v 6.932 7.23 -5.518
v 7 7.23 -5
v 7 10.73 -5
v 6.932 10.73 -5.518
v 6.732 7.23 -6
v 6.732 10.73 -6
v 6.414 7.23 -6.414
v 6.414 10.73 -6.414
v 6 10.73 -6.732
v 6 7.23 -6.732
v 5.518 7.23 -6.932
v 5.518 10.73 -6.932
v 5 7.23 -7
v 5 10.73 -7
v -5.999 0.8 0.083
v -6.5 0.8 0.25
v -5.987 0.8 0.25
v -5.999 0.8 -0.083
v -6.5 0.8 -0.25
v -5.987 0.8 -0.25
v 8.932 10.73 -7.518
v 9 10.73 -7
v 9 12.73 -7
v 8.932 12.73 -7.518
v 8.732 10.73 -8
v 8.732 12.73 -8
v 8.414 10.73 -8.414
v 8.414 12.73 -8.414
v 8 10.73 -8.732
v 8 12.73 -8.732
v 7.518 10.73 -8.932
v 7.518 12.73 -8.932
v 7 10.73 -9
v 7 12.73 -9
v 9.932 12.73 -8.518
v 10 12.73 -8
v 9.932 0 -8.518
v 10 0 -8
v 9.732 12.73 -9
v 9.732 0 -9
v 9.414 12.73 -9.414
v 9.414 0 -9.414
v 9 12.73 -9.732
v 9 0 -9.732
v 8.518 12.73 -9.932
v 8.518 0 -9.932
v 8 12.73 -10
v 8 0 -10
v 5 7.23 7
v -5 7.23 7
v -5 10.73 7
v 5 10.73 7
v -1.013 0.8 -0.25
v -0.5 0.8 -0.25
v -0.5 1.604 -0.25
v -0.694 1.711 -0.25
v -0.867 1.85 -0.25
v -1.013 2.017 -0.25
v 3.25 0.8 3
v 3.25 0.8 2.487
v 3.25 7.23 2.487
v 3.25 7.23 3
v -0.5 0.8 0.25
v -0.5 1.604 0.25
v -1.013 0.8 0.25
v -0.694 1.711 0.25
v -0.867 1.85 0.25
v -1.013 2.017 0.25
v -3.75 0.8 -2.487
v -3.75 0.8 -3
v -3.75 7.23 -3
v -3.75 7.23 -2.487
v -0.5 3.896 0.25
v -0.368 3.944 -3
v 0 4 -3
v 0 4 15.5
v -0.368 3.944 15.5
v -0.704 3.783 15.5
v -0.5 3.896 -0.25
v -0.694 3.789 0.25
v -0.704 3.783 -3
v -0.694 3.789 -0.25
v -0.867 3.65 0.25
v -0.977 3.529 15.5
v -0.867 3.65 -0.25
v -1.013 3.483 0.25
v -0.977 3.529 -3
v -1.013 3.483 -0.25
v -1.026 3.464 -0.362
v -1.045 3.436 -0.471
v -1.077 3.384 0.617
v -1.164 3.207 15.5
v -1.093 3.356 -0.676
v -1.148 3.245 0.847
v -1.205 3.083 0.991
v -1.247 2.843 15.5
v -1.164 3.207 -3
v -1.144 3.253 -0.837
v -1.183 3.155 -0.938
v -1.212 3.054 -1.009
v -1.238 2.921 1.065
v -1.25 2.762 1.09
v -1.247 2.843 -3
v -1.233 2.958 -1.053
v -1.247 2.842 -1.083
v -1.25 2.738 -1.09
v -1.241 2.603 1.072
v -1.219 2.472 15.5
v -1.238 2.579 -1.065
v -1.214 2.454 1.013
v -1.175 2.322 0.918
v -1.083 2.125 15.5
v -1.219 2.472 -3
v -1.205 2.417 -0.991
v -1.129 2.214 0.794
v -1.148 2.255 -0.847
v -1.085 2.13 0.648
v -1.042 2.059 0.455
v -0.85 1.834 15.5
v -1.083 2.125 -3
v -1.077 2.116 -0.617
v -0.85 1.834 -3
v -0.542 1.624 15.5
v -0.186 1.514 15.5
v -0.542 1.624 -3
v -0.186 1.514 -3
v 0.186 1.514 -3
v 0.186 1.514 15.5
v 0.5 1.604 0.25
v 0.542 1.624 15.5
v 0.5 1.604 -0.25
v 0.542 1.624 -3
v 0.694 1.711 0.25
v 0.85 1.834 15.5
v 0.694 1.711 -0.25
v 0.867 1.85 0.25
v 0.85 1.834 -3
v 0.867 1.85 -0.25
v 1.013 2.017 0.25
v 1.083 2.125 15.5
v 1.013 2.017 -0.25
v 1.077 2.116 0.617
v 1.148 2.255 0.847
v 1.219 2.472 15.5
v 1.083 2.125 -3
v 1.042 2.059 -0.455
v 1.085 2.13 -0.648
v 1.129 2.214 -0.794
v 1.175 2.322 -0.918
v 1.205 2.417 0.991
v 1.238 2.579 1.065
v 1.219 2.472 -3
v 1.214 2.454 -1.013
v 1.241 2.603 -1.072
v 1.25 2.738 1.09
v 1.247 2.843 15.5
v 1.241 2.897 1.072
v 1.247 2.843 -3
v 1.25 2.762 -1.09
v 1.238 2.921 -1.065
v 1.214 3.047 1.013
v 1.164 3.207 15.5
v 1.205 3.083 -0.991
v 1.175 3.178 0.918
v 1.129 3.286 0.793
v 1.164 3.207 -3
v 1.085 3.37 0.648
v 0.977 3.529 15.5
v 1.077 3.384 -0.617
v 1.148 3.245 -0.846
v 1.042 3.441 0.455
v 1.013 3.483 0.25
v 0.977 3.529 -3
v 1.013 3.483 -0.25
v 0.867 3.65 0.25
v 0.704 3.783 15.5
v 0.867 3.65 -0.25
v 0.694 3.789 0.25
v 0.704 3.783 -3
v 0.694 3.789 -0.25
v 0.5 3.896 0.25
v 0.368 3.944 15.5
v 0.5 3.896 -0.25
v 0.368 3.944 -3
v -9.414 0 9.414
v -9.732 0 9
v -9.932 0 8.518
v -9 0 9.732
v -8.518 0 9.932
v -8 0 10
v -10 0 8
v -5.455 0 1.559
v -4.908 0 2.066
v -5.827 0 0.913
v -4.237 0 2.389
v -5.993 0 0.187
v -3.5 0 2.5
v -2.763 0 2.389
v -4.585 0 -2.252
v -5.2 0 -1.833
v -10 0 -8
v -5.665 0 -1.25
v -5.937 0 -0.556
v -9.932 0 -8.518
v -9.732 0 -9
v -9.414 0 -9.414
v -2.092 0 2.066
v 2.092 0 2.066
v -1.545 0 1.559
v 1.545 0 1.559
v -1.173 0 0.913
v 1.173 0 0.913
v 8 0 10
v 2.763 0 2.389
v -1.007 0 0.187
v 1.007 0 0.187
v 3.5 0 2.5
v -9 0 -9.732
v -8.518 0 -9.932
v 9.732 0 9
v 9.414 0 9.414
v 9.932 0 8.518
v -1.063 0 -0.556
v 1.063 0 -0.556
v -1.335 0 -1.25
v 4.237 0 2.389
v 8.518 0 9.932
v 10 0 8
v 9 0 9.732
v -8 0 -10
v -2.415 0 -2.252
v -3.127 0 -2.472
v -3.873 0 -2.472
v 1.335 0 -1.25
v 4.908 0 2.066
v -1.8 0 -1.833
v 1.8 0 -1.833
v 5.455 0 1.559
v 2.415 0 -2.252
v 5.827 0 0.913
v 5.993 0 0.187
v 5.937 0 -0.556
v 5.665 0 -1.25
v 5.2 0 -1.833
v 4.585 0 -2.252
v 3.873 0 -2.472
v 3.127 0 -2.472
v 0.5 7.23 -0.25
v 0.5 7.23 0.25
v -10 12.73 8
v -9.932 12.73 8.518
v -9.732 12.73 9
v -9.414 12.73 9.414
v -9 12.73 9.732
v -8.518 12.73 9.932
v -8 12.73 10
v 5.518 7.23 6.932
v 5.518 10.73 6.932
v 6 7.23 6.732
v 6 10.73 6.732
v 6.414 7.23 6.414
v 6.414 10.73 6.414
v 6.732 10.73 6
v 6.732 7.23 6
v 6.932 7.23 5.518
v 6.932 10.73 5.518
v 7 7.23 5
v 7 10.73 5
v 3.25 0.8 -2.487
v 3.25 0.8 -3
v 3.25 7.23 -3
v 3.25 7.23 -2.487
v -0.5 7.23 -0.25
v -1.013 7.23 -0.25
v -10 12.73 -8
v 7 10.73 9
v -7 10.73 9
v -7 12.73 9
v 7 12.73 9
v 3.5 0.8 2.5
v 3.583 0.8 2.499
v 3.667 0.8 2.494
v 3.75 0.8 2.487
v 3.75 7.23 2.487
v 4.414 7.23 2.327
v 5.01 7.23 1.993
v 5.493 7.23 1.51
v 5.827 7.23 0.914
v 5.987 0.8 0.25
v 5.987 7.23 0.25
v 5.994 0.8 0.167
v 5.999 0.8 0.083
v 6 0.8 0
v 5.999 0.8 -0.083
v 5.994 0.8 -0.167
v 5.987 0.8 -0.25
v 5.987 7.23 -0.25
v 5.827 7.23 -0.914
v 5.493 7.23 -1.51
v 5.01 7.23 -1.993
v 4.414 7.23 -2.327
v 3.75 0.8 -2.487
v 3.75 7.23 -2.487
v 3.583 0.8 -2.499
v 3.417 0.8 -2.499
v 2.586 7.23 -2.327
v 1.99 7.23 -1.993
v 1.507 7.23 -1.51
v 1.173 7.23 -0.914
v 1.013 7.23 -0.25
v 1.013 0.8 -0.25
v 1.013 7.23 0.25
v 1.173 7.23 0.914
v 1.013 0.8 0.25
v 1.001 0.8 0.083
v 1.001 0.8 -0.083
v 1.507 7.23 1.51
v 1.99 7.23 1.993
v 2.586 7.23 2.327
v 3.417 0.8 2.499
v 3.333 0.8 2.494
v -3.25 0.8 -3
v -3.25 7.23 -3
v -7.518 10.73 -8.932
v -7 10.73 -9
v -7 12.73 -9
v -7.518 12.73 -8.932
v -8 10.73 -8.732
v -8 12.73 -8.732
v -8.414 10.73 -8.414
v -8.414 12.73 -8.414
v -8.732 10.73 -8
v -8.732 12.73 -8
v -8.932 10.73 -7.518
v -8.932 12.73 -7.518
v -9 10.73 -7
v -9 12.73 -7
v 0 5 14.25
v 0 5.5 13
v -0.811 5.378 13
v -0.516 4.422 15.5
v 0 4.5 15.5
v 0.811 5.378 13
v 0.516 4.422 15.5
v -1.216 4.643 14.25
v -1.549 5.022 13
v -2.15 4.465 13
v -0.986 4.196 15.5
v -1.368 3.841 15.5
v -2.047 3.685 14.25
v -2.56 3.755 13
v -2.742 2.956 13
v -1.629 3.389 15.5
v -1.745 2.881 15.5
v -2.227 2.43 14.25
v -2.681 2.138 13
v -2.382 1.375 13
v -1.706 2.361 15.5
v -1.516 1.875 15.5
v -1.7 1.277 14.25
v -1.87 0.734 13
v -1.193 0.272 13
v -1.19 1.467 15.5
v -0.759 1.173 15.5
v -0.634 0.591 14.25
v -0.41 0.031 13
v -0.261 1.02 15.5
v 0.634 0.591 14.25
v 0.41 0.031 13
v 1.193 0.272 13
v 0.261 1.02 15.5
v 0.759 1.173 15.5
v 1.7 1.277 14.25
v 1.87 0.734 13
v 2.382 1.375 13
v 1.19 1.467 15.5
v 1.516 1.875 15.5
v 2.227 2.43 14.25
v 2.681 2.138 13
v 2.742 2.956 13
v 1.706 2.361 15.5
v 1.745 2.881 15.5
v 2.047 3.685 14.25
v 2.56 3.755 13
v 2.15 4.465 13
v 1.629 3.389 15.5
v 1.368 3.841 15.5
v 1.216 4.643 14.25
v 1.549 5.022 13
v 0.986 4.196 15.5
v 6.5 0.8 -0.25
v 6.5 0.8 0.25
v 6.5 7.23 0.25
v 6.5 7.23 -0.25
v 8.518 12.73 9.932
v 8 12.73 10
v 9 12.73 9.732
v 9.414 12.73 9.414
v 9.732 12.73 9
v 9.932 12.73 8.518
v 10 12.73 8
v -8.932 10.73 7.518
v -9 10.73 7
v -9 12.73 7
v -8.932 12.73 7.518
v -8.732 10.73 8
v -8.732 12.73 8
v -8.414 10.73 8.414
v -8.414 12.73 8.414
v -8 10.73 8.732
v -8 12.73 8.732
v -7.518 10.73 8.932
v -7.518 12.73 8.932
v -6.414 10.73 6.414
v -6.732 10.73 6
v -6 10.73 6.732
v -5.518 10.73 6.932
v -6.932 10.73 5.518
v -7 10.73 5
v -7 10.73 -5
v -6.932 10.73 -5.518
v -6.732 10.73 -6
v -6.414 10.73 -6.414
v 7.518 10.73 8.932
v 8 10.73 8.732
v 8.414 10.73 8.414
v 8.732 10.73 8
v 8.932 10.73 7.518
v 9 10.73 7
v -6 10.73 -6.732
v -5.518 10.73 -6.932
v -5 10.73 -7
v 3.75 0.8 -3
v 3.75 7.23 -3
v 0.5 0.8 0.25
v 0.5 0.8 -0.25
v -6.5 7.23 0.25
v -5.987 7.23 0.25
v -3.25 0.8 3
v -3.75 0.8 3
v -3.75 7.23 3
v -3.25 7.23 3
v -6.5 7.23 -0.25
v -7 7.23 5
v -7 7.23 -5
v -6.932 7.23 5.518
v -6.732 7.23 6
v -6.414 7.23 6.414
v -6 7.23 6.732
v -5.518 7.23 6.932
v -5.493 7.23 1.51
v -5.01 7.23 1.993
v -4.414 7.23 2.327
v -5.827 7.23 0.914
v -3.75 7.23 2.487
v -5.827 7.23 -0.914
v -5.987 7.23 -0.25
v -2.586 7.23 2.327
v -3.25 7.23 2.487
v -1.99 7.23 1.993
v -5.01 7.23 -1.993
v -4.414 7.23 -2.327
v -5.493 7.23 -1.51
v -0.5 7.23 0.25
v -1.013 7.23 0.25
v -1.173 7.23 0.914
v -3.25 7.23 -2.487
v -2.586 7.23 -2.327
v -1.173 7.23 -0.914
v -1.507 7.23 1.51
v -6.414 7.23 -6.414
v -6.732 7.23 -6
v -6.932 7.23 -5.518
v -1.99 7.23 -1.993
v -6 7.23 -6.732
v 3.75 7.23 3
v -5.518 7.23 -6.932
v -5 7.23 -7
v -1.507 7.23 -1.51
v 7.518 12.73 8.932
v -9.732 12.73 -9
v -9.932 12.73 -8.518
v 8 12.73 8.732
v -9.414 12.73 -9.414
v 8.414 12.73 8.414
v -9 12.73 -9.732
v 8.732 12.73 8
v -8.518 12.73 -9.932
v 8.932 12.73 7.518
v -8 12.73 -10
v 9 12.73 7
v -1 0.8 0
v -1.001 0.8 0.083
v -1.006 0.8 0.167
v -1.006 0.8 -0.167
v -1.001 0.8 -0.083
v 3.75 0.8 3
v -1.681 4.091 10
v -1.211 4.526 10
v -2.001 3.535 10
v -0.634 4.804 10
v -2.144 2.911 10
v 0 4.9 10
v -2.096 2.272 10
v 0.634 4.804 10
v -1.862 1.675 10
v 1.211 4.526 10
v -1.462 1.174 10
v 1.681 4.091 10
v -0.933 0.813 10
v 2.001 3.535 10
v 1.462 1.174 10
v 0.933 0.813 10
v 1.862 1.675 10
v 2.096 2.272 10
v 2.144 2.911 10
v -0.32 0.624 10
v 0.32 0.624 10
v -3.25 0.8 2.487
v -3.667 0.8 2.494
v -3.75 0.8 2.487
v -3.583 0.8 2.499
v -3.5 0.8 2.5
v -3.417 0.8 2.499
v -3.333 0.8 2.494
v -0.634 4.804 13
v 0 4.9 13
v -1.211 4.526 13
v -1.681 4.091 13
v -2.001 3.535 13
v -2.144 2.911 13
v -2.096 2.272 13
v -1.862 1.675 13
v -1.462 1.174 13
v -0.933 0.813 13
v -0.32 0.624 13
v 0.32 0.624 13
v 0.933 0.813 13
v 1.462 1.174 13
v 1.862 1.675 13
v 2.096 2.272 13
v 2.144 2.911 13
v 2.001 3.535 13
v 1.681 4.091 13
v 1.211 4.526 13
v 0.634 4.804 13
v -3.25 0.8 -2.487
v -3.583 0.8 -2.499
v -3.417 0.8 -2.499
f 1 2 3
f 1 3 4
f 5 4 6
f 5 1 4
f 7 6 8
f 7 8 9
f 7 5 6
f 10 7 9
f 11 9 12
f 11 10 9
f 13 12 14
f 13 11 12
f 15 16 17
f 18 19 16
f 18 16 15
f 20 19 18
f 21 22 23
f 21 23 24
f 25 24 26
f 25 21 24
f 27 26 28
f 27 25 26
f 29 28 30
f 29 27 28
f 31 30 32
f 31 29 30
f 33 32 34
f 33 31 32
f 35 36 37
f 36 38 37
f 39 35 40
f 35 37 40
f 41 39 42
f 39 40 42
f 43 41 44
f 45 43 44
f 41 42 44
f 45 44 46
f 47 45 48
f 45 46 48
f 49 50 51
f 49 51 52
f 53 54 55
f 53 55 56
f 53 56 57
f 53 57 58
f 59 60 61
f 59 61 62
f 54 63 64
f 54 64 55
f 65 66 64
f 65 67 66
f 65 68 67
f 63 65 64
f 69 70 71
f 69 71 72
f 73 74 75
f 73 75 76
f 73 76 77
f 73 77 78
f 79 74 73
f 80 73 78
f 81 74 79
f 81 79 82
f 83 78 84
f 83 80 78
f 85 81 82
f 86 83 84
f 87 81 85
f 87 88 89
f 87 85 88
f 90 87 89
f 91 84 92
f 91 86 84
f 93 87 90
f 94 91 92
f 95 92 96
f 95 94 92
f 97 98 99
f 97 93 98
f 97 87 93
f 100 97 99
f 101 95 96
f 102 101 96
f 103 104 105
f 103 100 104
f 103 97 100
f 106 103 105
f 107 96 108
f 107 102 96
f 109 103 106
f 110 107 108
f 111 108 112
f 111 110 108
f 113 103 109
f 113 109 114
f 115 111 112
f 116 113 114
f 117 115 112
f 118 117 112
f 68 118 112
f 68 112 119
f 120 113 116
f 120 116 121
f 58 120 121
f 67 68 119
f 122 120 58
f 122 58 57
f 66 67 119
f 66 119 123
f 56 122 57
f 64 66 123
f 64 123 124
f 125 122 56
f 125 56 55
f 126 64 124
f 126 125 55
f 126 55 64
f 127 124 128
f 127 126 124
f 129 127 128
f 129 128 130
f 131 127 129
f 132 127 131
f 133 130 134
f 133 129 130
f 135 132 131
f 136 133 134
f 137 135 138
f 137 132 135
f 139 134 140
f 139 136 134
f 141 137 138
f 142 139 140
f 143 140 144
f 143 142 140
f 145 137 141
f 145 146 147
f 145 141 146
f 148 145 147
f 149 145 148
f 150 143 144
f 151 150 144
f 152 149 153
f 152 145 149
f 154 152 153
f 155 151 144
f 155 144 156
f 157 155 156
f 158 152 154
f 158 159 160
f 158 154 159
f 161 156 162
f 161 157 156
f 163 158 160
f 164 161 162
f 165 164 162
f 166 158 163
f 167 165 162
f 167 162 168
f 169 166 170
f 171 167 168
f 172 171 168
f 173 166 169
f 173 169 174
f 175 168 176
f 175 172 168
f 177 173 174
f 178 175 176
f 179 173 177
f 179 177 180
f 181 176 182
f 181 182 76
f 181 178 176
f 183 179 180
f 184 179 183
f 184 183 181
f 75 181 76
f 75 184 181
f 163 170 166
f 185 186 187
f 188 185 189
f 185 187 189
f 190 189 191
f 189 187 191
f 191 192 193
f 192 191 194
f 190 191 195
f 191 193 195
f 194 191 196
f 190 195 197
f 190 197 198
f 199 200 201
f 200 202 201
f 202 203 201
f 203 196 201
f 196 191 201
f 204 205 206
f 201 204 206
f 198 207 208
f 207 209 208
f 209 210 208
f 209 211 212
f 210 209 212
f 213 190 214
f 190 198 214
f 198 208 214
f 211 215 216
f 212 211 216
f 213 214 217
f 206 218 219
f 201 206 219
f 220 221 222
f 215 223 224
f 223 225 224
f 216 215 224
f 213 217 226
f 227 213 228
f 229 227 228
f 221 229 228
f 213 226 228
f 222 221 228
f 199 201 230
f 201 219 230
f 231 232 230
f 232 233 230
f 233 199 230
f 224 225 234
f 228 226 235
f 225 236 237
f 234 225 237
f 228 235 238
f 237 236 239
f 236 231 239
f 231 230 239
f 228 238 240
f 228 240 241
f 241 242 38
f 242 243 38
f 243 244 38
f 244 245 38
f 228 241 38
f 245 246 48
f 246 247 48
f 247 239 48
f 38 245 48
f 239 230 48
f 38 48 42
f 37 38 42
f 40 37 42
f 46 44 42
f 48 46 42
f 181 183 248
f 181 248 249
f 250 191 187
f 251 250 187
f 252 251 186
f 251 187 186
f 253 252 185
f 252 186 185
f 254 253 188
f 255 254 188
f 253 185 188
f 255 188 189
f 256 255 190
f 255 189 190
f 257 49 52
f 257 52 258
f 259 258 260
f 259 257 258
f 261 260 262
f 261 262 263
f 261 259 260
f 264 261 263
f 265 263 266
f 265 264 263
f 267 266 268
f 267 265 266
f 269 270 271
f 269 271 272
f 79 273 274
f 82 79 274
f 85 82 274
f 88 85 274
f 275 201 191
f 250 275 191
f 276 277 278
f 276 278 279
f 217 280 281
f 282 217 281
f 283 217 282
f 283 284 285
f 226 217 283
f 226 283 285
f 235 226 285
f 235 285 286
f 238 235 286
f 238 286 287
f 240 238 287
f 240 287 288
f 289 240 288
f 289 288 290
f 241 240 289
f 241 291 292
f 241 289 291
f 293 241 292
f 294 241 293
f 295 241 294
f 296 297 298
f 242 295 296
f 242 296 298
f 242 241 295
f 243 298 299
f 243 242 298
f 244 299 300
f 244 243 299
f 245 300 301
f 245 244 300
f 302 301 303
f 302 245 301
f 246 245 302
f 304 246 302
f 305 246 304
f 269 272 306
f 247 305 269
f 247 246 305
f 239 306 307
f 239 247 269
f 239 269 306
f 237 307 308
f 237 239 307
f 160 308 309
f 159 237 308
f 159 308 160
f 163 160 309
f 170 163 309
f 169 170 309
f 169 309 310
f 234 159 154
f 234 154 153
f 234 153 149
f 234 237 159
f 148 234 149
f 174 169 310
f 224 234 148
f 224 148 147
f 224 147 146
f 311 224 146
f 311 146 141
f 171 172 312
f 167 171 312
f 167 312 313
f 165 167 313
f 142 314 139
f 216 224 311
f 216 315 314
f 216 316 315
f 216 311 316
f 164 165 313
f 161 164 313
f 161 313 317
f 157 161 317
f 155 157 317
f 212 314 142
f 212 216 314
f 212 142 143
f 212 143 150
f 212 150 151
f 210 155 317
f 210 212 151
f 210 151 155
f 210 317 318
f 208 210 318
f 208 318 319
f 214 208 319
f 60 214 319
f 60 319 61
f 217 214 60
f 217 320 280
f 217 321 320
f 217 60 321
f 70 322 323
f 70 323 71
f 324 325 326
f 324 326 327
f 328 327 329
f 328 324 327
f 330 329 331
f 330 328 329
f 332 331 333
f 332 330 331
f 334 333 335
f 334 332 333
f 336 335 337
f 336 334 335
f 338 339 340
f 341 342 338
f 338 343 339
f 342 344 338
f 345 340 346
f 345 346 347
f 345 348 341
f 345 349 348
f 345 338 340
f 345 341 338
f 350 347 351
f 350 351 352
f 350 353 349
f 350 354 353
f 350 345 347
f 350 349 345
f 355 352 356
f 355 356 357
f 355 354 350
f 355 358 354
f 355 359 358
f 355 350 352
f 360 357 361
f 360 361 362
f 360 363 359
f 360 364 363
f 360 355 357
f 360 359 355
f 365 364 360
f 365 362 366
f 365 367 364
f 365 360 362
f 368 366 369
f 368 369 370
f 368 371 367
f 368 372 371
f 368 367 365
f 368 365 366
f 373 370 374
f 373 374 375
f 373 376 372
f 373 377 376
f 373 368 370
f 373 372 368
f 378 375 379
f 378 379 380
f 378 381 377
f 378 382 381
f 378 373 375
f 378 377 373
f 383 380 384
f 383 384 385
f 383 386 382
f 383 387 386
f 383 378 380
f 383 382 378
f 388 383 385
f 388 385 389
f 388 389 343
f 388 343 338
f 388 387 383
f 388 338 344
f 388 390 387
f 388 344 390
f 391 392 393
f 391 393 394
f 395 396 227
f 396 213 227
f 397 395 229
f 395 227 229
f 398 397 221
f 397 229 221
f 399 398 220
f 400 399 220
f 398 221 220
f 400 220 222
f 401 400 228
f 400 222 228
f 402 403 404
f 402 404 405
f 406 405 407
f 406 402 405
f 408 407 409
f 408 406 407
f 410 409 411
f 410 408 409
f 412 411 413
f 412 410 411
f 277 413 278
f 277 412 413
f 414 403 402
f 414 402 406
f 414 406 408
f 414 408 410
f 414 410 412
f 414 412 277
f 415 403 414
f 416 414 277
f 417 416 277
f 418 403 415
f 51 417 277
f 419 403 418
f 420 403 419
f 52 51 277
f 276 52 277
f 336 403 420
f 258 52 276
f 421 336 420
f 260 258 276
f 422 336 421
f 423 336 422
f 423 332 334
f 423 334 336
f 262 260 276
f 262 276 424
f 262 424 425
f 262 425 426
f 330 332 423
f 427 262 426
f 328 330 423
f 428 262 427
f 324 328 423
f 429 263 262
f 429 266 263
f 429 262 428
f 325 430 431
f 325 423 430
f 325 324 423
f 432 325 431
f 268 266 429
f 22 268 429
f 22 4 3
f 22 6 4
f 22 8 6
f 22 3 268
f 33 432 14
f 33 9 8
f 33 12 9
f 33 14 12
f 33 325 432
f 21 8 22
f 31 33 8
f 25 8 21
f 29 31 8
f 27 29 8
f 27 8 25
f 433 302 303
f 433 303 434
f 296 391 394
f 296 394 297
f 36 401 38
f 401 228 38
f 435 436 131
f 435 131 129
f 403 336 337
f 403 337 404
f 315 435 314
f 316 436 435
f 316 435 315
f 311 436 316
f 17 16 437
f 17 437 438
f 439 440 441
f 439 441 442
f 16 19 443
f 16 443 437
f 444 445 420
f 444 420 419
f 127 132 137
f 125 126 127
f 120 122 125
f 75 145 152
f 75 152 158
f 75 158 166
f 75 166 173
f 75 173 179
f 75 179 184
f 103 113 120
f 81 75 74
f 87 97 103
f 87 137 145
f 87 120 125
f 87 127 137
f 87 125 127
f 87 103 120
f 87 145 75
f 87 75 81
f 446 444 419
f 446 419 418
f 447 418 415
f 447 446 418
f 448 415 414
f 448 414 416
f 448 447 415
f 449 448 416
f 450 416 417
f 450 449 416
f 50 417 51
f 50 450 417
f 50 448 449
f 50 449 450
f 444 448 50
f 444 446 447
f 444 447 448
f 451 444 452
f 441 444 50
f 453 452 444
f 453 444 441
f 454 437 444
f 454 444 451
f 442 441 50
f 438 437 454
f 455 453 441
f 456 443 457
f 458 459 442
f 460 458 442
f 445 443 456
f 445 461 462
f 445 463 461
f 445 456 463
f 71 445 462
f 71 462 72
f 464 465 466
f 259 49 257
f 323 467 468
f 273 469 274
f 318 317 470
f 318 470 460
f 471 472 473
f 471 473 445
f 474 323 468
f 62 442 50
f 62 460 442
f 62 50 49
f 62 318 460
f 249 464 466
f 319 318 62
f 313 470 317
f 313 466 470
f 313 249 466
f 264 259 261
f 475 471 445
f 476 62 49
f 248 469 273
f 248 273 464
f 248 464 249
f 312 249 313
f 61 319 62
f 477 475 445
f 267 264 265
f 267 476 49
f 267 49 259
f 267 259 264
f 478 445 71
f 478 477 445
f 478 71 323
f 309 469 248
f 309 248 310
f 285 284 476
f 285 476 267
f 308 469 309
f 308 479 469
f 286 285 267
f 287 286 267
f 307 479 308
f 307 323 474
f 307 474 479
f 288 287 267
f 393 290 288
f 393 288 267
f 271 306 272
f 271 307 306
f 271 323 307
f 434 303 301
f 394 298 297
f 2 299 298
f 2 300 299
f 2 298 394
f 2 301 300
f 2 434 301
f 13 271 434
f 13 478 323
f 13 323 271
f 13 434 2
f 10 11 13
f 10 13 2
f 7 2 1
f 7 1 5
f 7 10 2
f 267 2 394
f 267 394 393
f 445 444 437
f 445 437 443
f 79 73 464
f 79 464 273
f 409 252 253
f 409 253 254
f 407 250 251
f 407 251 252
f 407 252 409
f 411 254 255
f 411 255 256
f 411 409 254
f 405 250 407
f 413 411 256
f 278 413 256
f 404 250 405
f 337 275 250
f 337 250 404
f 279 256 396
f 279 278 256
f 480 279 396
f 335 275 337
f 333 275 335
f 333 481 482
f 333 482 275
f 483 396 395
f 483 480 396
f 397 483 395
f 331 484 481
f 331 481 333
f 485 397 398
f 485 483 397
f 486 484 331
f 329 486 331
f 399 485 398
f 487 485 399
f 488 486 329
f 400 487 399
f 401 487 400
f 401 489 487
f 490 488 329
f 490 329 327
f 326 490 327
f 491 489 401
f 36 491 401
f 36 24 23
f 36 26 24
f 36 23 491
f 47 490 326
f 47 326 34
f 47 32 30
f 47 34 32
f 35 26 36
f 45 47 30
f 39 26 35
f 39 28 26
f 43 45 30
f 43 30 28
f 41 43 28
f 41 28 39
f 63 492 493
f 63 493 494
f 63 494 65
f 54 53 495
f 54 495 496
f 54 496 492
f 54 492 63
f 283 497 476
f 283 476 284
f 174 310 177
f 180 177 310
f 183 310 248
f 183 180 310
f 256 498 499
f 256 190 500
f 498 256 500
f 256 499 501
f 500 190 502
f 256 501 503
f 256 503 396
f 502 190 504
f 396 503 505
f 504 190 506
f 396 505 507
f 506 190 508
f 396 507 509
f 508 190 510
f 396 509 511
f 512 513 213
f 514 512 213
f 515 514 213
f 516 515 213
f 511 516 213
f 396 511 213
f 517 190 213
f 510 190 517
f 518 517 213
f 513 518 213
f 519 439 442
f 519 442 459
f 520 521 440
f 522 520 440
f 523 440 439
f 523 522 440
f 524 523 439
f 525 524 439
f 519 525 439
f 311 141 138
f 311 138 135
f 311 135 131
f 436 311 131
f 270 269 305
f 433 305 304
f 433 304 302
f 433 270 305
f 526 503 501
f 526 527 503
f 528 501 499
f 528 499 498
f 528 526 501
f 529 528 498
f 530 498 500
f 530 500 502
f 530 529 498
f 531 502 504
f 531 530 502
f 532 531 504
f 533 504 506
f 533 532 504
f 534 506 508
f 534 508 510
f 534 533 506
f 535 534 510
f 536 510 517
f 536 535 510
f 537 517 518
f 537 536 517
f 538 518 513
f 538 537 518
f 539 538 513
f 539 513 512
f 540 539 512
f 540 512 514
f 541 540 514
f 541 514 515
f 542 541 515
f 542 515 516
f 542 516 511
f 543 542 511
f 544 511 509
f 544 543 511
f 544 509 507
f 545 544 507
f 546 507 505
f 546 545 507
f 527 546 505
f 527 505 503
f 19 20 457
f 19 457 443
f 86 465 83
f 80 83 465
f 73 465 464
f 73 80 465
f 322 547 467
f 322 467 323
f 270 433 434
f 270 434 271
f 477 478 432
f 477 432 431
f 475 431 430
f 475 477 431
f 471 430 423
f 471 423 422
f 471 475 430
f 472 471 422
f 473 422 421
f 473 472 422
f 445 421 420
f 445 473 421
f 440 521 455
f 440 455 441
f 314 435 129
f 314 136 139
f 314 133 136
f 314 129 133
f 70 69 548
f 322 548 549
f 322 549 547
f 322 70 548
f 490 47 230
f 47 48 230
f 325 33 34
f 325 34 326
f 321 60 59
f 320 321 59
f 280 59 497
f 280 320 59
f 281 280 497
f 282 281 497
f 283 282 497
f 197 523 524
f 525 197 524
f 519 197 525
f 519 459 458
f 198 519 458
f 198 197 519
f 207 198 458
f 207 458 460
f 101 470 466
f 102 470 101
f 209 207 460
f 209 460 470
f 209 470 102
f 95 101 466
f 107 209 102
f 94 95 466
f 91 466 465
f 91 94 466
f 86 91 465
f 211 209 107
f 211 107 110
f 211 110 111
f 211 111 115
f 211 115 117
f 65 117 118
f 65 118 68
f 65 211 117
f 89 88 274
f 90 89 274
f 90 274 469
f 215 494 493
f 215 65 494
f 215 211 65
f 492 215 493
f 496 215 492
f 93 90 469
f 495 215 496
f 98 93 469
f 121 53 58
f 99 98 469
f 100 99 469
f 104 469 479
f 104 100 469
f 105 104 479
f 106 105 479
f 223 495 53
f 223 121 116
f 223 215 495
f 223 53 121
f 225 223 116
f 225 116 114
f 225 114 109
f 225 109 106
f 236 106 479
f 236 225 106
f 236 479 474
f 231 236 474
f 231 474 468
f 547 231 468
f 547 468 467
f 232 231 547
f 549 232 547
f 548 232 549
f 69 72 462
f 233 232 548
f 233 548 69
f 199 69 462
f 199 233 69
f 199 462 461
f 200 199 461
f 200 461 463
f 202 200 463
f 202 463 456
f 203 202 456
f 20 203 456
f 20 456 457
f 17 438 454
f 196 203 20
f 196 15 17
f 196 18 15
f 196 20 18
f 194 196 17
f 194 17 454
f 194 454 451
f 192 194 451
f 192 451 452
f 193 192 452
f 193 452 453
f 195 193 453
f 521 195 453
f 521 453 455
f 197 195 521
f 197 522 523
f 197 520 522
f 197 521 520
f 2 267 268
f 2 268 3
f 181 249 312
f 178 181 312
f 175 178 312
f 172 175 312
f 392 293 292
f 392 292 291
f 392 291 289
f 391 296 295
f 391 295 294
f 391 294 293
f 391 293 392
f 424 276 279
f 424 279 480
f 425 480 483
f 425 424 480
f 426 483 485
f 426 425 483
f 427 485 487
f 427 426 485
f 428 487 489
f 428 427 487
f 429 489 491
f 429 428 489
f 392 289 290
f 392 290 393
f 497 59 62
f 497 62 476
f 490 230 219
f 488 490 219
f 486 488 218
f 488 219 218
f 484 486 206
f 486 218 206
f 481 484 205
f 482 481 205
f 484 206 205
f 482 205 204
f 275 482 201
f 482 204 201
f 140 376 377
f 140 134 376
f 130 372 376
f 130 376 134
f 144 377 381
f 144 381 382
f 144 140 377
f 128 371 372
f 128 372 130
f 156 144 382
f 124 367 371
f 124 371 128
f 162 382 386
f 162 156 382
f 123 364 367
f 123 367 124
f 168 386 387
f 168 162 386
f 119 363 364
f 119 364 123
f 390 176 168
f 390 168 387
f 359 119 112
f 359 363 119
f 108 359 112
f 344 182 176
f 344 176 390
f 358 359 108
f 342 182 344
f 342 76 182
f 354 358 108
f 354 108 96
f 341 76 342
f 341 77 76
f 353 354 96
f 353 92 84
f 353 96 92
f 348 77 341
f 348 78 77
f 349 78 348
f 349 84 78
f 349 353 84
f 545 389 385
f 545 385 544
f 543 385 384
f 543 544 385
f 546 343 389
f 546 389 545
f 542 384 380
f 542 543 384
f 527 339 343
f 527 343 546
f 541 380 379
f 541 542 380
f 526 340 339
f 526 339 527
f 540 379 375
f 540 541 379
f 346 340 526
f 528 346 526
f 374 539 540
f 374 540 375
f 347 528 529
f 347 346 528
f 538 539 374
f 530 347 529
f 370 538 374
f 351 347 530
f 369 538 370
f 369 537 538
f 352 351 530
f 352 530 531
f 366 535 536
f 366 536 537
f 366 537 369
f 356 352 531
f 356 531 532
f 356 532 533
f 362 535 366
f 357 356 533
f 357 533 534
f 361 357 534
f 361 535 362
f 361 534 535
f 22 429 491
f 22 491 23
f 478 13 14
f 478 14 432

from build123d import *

# Parameters (mm, degrees)
SKETCH1_R           = 2.5
BOSS_EXTRUDE1_DEPTH = 7.23
CUT_EXTRUDE1_START  = -6.43
CUT_EXTRUDE1_DEPTH  = 6.43
CUT_EXTRUDE2_START  = -13
SKETCH5_R           = 1.25
CUT_EXTRUDE2_DEPTH  = 13
BOSS_EXTRUDE2_DEPTH = 3.5
BOSS_EXTRUDE3_DEPTH = 2


with BuildPart() as part:
    # Sketch1 → Boss-Extrude1 (new body)
    with BuildSketch(Plane(origin=(0, 0, 0), x_dir=(1, 0, 0), z_dir=(0, 1, 0))):
        with BuildLine():
            Line((-8, -10), (8, -10))
            ThreePointArc((8, -10), (9.414213562, -9.414213562), (10, -8))
            Line((10, -8), (10, 8))
            ThreePointArc((10, 8), (9.414213562, 9.414213562), (8, 10))
            Line((8, 10), (-8, 10))
            ThreePointArc((-8, 10), (-9.414213562, 9.414213562), (-10, 8))
            Line((-10, 8), (-10, -8))
            ThreePointArc((-10, -8), (-9.414213562, -9.414213562), (-8, -10))
        make_face()
        with Locations(Location((3.5, 0, 0), (0, 0, 270))):
            Circle(SKETCH1_R, mode=Mode.SUBTRACT)
        with Locations(Location((-3.5, 0, 0), (0, 0, 270))):
            Circle(SKETCH1_R, mode=Mode.SUBTRACT)
    extrude(amount=BOSS_EXTRUDE1_DEPTH)

    # Sketch2 → Cut-Extrude1 (cut)
    with BuildSketch(Plane(origin=(0, 7.23, 0), x_dir=(1, 0, 0), z_dir=(0, 1, 0)).offset(CUT_EXTRUDE1_START)):
        with BuildLine():
            Line((3.25, 3), (3.25, 2.487468593))
            ThreePointArc((3.25, 2.487468593), (3.5, 2.5), (3.75, 2.487468593))
            Line((3.75, 2.487468593), (3.75, 3))
            Line((3.75, 3), (3.25, 3))
        make_face()
        with BuildLine():
            ThreePointArc((6, 0), (5.996865183, -0.125156938), (5.987468593, -0.25))
            Line((5.987468593, -0.25), (6.5, -0.25))
            Line((6.5, -0.25), (6.5, 0.25))
            Line((6.5, 0.25), (5.987468593, 0.25))
            ThreePointArc((5.987468593, 0.25), (5.996865183, 0.125156938), (6, 0))
        make_face()
        with BuildLine():
            Line((3.25, -2.487468593), (3.25, -3))
            Line((3.25, -3), (3.75, -3))
            Line((3.75, -3), (3.75, -2.487468593))
            ThreePointArc((3.75, -2.487468593), (3.5, -2.5), (3.25, -2.487468593))
        make_face()
        with BuildLine():
            Line((0.5, -0.25), (1.012531407, -0.25))
            ThreePointArc((1.012531407, -0.25), (1, 0), (1.012531407, 0.25))
            Line((1.012531407, 0.25), (0.5, 0.25))
            Line((0.5, 0.25), (0.5, -0.25))
        make_face()
        with BuildLine():
            ThreePointArc((-1, 0), (-1.003134817, -0.125156938), (-1.012531407, -0.25))
            Line((-1.012531407, -0.25), (-0.5, -0.25))
            Line((-0.5, -0.25), (-0.5, 0.25))
            Line((-0.5, 0.25), (-1.012531407, 0.25))
            ThreePointArc((-1.012531407, 0.25), (-1.003134817, 0.125156938), (-1, 0))
        make_face()
        with BuildLine():
            Line((-3.75, 3), (-3.75, 2.487468593))
            ThreePointArc((-3.75, 2.487468593), (-3.5, 2.5), (-3.25, 2.487468593))
            Line((-3.25, 2.487468593), (-3.25, 3))
            Line((-3.25, 3), (-3.75, 3))
        make_face()
        with BuildLine():
            Line((-6.5, 0.25), (-6.5, -0.25))
            Line((-6.5, -0.25), (-5.987468593, -0.25))
            ThreePointArc((-5.987468593, -0.25), (-6, 0), (-5.987468593, 0.25))
            Line((-5.987468593, 0.25), (-6.5, 0.25))
        make_face()
        with BuildLine():
            ThreePointArc((-3.25, -2.487468593), (-3.5, -2.5), (-3.75, -2.487468593))
            Line((-3.75, -2.487468593), (-3.75, -3))
            Line((-3.75, -3), (-3.25, -3))
            Line((-3.25, -3), (-3.25, -2.487468593))
        make_face()
    extrude(amount=CUT_EXTRUDE1_DEPTH, mode=Mode.SUBTRACT)

    # Sketch3 → Revolve1 (revolve)
    with BuildSketch(Plane(origin=(0, 0, 0), x_dir=(0, 0, -1), z_dir=(1, 0, 0)), mode=Mode.PRIVATE) as revolve1_sk:
        Polygon((-10, 0.6), (-13, 0.6), (-13, 0), (-15.5, 1), (-15.5, 1.5), (-10, 1.5), align=None)
    revolve(revolve1_sk.sketch.rotate(Axis((0, 2.75, 10), (0, 0, 1)), 180), axis=Axis((0, 2.75, 10), (0, 0, 1)))

    # Sketch5 → Cut-Extrude2 (cut)
    with BuildSketch(Plane.XY.offset(10).offset(CUT_EXTRUDE2_START)):
        with Locations(Location((0, 2.75, 0), (0, 0, 90))):
            Circle(SKETCH5_R)
    extrude(amount=CUT_EXTRUDE2_DEPTH, mode=Mode.SUBTRACT)

    # Sketch6 → Boss-Extrude2 (add)
    with BuildSketch(Plane(origin=(0, 7.23, 0), x_dir=(1, 0, 0), z_dir=(0, 1, 0))):
        with BuildLine():
            Line((-8, -10), (8, -10))
            ThreePointArc((8, -10), (9.414213562, -9.414213562), (10, -8))
            Line((10, -8), (10, 8))
            ThreePointArc((10, 8), (9.414213562, 9.414213562), (8, 10))
            Line((8, 10), (-8, 10))
            ThreePointArc((-8, 10), (-9.414213562, 9.414213562), (-10, 8))
            Line((-10, 8), (-10, -8))
            ThreePointArc((-10, -8), (-9.414213562, -9.414213562), (-8, -10))
        make_face()
        with BuildLine():
            Line((-5, -7), (5, -7))
            ThreePointArc((5, -7), (6.414213562, -6.414213562), (7, -5))
            Line((7, -5), (7, 5))
            ThreePointArc((7, 5), (6.414213562, 6.414213562), (5, 7))
            Line((5, 7), (-5, 7))
            ThreePointArc((-5, 7), (-6.414213562, 6.414213562), (-7, 5))
            Line((-7, 5), (-7, -5))
            ThreePointArc((-7, -5), (-6.414213562, -6.414213562), (-5, -7))
        make_face(mode=Mode.SUBTRACT)
    extrude(amount=BOSS_EXTRUDE2_DEPTH)

    # Sketch8 → Boss-Extrude3 (add)
    with BuildSketch(Plane(origin=(0, 10.73, 0), x_dir=(1, 0, 0), z_dir=(0, 1, 0))):
        with BuildLine():
            Line((-8, -10), (8, -10))
            ThreePointArc((8, -10), (9.414213562, -9.414213562), (10, -8))
            Line((10, -8), (10, 8))
            ThreePointArc((10, 8), (9.414213562, 9.414213562), (8, 10))
            Line((8, 10), (-8, 10))
            ThreePointArc((-8, 10), (-9.414213562, 9.414213562), (-10, 8))
            Line((-10, 8), (-10, -8))
            ThreePointArc((-10, -8), (-9.414213562, -9.414213562), (-8, -10))
        make_face()
        with BuildLine():
            Line((-7, -9), (7, -9))
            ThreePointArc((7, -9), (8.414213562, -8.414213562), (9, -7))
            Line((9, -7), (9, 7))
            ThreePointArc((9, 7), (8.414213562, 8.414213562), (7, 9))
            Line((7, 9), (-7, 9))
            ThreePointArc((-7, 9), (-8.414213562, 8.414213562), (-9, 7))
            Line((-9, 7), (-9, -7))
            ThreePointArc((-9, -7), (-8.414213562, -8.414213562), (-7, -9))
        make_face(mode=Mode.SUBTRACT)
    extrude(amount=BOSS_EXTRUDE3_DEPTH)


solid = part.part
